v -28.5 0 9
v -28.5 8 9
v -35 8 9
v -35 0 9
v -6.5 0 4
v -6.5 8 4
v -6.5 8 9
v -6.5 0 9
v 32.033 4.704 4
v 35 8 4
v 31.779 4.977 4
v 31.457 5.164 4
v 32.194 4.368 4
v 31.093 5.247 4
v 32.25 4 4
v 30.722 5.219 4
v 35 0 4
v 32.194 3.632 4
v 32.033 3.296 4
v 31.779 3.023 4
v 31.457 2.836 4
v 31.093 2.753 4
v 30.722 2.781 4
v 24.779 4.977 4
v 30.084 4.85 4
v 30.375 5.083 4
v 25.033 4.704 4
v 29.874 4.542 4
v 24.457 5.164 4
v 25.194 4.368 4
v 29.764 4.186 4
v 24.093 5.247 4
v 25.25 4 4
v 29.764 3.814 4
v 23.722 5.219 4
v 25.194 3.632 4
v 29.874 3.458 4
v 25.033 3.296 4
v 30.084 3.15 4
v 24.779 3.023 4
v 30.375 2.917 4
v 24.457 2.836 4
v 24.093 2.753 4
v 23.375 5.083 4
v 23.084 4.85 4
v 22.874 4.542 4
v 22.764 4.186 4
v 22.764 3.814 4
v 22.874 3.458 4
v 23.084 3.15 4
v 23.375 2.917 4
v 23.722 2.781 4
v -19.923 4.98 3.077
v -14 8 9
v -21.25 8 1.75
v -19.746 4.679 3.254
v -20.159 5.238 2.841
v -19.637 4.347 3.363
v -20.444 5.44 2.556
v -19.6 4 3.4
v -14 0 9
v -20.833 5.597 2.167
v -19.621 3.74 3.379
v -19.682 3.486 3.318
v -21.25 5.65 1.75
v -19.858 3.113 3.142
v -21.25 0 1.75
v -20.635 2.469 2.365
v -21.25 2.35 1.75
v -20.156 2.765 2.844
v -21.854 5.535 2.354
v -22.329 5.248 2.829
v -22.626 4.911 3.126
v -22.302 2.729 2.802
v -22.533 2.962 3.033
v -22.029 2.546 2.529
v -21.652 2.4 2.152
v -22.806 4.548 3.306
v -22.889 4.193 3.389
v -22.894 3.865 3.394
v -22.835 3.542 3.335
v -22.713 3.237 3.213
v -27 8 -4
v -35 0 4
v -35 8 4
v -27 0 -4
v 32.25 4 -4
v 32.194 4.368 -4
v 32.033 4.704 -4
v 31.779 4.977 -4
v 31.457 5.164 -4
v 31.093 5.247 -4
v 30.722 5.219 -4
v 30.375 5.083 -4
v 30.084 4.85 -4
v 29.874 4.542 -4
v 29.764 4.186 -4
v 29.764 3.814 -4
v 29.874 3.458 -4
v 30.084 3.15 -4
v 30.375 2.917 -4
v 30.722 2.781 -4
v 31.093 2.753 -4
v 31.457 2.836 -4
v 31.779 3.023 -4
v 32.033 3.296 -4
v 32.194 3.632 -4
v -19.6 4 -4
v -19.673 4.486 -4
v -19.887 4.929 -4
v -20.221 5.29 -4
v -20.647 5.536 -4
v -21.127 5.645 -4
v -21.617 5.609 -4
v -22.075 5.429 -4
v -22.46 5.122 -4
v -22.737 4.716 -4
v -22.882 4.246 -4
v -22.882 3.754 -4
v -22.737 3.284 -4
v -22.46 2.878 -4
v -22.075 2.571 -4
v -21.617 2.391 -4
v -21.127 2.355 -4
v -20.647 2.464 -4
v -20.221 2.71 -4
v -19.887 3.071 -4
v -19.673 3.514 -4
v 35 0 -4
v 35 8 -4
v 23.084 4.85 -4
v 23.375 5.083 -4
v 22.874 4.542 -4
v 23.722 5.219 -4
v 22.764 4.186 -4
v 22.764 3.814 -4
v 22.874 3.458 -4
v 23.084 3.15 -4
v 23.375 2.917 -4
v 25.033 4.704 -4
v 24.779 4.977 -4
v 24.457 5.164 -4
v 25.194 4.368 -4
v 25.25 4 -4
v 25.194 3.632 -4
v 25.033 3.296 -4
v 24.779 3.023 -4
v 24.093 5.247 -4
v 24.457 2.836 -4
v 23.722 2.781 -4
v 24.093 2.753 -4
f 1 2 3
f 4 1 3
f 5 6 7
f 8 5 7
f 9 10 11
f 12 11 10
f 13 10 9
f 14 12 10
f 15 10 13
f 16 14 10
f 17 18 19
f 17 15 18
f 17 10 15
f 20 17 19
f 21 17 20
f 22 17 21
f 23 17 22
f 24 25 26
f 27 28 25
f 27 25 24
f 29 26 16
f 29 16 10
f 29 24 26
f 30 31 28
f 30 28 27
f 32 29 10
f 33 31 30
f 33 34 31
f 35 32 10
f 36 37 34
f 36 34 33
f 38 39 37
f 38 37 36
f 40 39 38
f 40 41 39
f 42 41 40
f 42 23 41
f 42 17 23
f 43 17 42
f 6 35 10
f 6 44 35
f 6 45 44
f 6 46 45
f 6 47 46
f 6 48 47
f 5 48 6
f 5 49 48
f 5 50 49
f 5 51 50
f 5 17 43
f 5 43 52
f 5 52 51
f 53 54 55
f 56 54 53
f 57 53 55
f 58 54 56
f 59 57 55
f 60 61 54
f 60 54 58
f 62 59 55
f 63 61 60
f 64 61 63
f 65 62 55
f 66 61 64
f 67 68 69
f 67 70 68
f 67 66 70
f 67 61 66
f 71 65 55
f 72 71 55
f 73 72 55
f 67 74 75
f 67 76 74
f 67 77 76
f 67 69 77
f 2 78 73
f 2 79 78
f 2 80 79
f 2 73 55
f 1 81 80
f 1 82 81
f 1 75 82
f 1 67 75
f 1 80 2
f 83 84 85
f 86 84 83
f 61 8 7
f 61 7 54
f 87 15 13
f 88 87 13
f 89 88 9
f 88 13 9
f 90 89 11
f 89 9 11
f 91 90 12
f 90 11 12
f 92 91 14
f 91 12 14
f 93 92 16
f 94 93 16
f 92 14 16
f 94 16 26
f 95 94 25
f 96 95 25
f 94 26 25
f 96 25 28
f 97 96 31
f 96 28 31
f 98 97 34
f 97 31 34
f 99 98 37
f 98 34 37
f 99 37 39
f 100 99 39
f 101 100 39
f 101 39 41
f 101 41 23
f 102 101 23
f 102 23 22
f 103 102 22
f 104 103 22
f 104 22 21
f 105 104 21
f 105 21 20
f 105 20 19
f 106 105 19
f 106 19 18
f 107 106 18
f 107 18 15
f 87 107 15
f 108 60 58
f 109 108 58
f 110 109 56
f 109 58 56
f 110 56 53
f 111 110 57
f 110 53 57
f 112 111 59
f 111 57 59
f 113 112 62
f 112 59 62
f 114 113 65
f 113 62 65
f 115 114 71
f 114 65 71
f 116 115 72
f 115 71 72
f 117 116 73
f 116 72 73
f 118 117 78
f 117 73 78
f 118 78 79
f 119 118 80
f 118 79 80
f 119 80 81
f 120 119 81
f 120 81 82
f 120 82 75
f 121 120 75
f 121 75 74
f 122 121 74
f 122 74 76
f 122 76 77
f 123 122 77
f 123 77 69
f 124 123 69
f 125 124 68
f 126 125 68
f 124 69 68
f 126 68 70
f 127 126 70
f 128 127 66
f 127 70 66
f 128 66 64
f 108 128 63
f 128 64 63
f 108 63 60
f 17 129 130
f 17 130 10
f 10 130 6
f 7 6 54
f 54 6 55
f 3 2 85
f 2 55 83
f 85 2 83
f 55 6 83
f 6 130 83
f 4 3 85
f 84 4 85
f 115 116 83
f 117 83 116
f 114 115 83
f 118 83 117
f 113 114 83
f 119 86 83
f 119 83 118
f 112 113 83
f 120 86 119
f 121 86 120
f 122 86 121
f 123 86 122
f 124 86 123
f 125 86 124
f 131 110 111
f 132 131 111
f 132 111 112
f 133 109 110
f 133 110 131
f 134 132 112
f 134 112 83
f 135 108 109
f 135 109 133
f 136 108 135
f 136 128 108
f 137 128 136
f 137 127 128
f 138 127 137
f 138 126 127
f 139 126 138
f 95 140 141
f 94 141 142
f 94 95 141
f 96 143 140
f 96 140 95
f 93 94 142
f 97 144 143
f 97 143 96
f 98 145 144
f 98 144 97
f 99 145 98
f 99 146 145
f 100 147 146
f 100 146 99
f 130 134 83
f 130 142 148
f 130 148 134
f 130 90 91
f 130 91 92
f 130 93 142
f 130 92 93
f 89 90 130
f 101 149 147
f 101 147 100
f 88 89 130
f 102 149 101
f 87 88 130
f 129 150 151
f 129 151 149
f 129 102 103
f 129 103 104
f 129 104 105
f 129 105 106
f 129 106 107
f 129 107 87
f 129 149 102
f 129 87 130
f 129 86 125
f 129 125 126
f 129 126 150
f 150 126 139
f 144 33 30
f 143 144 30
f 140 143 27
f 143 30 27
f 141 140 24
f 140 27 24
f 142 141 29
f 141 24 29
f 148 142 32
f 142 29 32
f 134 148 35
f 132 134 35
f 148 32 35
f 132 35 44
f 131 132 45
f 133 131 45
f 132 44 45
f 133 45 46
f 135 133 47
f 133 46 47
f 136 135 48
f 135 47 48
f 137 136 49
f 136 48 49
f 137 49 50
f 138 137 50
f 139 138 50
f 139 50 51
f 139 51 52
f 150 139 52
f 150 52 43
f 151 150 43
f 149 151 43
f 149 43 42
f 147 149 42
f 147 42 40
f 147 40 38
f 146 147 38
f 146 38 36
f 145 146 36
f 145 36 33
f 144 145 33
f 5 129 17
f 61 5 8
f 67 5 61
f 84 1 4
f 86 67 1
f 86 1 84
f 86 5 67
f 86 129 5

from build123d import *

# Parameters (mm, degrees)
BOSS_EXTRUDE2_DEPTH   = 8
M4_TAPPED_HOLE1_D     = 3.3
M4_TAPPED_HOLE1_DEPTH = 11.5
M4_TAPPED_HOLE1_TIP   = 0.991420021
M3_TAPPED_HOLE1_D     = 2.5
M3_TAPPED_HOLE1_DEPTH = 8.5
M3_TAPPED_HOLE1_TIP   = 0.751075774


with BuildPart() as part:
    # Sketch1 → Boss-Extrude2 (new body)
    with BuildSketch(Plane(origin=(0, 0, 0), x_dir=(1, 0, 0), z_dir=(0, 1, 0))):
        Polygon((-35, -4), (-27, 4), (35, 4), (35, -4), (-6.5, -4), (-6.5, -9), (-14, -9), (-21.25, -1.75), (-28.5, -9), (-35, -9), align=None)
    extrude(amount=BOSS_EXTRUDE2_DEPTH)

    # M4 Tapped Hole1
    with Locations(Plane(origin=(0, 0, -4), x_dir=(-1, 0, 0), z_dir=(0, 0, -1))):
        with Locations((21.25, 4)):
            Hole(M4_TAPPED_HOLE1_D / 2, depth=M4_TAPPED_HOLE1_DEPTH)
            with Locations((0, 0, -(M4_TAPPED_HOLE1_DEPTH + M4_TAPPED_HOLE1_TIP / 2))):  # 118° drill point
                Cone(0, M4_TAPPED_HOLE1_D / 2, M4_TAPPED_HOLE1_TIP, mode=Mode.SUBTRACT)

    # M3 Tapped Hole1
    with Locations(Plane(origin=(0, 0, -4), x_dir=(-1, 0, 0), z_dir=(0, 0, -1))):
        with Locations((-31, 4), (-24, 4)):
            Hole(M3_TAPPED_HOLE1_D / 2, depth=M3_TAPPED_HOLE1_DEPTH)
            with Locations((0, 0, -(M3_TAPPED_HOLE1_DEPTH + M3_TAPPED_HOLE1_TIP / 2))):  # 118° drill point
                Cone(0, M3_TAPPED_HOLE1_D / 2, M3_TAPPED_HOLE1_TIP, mode=Mode.SUBTRACT)


solid = part.part
